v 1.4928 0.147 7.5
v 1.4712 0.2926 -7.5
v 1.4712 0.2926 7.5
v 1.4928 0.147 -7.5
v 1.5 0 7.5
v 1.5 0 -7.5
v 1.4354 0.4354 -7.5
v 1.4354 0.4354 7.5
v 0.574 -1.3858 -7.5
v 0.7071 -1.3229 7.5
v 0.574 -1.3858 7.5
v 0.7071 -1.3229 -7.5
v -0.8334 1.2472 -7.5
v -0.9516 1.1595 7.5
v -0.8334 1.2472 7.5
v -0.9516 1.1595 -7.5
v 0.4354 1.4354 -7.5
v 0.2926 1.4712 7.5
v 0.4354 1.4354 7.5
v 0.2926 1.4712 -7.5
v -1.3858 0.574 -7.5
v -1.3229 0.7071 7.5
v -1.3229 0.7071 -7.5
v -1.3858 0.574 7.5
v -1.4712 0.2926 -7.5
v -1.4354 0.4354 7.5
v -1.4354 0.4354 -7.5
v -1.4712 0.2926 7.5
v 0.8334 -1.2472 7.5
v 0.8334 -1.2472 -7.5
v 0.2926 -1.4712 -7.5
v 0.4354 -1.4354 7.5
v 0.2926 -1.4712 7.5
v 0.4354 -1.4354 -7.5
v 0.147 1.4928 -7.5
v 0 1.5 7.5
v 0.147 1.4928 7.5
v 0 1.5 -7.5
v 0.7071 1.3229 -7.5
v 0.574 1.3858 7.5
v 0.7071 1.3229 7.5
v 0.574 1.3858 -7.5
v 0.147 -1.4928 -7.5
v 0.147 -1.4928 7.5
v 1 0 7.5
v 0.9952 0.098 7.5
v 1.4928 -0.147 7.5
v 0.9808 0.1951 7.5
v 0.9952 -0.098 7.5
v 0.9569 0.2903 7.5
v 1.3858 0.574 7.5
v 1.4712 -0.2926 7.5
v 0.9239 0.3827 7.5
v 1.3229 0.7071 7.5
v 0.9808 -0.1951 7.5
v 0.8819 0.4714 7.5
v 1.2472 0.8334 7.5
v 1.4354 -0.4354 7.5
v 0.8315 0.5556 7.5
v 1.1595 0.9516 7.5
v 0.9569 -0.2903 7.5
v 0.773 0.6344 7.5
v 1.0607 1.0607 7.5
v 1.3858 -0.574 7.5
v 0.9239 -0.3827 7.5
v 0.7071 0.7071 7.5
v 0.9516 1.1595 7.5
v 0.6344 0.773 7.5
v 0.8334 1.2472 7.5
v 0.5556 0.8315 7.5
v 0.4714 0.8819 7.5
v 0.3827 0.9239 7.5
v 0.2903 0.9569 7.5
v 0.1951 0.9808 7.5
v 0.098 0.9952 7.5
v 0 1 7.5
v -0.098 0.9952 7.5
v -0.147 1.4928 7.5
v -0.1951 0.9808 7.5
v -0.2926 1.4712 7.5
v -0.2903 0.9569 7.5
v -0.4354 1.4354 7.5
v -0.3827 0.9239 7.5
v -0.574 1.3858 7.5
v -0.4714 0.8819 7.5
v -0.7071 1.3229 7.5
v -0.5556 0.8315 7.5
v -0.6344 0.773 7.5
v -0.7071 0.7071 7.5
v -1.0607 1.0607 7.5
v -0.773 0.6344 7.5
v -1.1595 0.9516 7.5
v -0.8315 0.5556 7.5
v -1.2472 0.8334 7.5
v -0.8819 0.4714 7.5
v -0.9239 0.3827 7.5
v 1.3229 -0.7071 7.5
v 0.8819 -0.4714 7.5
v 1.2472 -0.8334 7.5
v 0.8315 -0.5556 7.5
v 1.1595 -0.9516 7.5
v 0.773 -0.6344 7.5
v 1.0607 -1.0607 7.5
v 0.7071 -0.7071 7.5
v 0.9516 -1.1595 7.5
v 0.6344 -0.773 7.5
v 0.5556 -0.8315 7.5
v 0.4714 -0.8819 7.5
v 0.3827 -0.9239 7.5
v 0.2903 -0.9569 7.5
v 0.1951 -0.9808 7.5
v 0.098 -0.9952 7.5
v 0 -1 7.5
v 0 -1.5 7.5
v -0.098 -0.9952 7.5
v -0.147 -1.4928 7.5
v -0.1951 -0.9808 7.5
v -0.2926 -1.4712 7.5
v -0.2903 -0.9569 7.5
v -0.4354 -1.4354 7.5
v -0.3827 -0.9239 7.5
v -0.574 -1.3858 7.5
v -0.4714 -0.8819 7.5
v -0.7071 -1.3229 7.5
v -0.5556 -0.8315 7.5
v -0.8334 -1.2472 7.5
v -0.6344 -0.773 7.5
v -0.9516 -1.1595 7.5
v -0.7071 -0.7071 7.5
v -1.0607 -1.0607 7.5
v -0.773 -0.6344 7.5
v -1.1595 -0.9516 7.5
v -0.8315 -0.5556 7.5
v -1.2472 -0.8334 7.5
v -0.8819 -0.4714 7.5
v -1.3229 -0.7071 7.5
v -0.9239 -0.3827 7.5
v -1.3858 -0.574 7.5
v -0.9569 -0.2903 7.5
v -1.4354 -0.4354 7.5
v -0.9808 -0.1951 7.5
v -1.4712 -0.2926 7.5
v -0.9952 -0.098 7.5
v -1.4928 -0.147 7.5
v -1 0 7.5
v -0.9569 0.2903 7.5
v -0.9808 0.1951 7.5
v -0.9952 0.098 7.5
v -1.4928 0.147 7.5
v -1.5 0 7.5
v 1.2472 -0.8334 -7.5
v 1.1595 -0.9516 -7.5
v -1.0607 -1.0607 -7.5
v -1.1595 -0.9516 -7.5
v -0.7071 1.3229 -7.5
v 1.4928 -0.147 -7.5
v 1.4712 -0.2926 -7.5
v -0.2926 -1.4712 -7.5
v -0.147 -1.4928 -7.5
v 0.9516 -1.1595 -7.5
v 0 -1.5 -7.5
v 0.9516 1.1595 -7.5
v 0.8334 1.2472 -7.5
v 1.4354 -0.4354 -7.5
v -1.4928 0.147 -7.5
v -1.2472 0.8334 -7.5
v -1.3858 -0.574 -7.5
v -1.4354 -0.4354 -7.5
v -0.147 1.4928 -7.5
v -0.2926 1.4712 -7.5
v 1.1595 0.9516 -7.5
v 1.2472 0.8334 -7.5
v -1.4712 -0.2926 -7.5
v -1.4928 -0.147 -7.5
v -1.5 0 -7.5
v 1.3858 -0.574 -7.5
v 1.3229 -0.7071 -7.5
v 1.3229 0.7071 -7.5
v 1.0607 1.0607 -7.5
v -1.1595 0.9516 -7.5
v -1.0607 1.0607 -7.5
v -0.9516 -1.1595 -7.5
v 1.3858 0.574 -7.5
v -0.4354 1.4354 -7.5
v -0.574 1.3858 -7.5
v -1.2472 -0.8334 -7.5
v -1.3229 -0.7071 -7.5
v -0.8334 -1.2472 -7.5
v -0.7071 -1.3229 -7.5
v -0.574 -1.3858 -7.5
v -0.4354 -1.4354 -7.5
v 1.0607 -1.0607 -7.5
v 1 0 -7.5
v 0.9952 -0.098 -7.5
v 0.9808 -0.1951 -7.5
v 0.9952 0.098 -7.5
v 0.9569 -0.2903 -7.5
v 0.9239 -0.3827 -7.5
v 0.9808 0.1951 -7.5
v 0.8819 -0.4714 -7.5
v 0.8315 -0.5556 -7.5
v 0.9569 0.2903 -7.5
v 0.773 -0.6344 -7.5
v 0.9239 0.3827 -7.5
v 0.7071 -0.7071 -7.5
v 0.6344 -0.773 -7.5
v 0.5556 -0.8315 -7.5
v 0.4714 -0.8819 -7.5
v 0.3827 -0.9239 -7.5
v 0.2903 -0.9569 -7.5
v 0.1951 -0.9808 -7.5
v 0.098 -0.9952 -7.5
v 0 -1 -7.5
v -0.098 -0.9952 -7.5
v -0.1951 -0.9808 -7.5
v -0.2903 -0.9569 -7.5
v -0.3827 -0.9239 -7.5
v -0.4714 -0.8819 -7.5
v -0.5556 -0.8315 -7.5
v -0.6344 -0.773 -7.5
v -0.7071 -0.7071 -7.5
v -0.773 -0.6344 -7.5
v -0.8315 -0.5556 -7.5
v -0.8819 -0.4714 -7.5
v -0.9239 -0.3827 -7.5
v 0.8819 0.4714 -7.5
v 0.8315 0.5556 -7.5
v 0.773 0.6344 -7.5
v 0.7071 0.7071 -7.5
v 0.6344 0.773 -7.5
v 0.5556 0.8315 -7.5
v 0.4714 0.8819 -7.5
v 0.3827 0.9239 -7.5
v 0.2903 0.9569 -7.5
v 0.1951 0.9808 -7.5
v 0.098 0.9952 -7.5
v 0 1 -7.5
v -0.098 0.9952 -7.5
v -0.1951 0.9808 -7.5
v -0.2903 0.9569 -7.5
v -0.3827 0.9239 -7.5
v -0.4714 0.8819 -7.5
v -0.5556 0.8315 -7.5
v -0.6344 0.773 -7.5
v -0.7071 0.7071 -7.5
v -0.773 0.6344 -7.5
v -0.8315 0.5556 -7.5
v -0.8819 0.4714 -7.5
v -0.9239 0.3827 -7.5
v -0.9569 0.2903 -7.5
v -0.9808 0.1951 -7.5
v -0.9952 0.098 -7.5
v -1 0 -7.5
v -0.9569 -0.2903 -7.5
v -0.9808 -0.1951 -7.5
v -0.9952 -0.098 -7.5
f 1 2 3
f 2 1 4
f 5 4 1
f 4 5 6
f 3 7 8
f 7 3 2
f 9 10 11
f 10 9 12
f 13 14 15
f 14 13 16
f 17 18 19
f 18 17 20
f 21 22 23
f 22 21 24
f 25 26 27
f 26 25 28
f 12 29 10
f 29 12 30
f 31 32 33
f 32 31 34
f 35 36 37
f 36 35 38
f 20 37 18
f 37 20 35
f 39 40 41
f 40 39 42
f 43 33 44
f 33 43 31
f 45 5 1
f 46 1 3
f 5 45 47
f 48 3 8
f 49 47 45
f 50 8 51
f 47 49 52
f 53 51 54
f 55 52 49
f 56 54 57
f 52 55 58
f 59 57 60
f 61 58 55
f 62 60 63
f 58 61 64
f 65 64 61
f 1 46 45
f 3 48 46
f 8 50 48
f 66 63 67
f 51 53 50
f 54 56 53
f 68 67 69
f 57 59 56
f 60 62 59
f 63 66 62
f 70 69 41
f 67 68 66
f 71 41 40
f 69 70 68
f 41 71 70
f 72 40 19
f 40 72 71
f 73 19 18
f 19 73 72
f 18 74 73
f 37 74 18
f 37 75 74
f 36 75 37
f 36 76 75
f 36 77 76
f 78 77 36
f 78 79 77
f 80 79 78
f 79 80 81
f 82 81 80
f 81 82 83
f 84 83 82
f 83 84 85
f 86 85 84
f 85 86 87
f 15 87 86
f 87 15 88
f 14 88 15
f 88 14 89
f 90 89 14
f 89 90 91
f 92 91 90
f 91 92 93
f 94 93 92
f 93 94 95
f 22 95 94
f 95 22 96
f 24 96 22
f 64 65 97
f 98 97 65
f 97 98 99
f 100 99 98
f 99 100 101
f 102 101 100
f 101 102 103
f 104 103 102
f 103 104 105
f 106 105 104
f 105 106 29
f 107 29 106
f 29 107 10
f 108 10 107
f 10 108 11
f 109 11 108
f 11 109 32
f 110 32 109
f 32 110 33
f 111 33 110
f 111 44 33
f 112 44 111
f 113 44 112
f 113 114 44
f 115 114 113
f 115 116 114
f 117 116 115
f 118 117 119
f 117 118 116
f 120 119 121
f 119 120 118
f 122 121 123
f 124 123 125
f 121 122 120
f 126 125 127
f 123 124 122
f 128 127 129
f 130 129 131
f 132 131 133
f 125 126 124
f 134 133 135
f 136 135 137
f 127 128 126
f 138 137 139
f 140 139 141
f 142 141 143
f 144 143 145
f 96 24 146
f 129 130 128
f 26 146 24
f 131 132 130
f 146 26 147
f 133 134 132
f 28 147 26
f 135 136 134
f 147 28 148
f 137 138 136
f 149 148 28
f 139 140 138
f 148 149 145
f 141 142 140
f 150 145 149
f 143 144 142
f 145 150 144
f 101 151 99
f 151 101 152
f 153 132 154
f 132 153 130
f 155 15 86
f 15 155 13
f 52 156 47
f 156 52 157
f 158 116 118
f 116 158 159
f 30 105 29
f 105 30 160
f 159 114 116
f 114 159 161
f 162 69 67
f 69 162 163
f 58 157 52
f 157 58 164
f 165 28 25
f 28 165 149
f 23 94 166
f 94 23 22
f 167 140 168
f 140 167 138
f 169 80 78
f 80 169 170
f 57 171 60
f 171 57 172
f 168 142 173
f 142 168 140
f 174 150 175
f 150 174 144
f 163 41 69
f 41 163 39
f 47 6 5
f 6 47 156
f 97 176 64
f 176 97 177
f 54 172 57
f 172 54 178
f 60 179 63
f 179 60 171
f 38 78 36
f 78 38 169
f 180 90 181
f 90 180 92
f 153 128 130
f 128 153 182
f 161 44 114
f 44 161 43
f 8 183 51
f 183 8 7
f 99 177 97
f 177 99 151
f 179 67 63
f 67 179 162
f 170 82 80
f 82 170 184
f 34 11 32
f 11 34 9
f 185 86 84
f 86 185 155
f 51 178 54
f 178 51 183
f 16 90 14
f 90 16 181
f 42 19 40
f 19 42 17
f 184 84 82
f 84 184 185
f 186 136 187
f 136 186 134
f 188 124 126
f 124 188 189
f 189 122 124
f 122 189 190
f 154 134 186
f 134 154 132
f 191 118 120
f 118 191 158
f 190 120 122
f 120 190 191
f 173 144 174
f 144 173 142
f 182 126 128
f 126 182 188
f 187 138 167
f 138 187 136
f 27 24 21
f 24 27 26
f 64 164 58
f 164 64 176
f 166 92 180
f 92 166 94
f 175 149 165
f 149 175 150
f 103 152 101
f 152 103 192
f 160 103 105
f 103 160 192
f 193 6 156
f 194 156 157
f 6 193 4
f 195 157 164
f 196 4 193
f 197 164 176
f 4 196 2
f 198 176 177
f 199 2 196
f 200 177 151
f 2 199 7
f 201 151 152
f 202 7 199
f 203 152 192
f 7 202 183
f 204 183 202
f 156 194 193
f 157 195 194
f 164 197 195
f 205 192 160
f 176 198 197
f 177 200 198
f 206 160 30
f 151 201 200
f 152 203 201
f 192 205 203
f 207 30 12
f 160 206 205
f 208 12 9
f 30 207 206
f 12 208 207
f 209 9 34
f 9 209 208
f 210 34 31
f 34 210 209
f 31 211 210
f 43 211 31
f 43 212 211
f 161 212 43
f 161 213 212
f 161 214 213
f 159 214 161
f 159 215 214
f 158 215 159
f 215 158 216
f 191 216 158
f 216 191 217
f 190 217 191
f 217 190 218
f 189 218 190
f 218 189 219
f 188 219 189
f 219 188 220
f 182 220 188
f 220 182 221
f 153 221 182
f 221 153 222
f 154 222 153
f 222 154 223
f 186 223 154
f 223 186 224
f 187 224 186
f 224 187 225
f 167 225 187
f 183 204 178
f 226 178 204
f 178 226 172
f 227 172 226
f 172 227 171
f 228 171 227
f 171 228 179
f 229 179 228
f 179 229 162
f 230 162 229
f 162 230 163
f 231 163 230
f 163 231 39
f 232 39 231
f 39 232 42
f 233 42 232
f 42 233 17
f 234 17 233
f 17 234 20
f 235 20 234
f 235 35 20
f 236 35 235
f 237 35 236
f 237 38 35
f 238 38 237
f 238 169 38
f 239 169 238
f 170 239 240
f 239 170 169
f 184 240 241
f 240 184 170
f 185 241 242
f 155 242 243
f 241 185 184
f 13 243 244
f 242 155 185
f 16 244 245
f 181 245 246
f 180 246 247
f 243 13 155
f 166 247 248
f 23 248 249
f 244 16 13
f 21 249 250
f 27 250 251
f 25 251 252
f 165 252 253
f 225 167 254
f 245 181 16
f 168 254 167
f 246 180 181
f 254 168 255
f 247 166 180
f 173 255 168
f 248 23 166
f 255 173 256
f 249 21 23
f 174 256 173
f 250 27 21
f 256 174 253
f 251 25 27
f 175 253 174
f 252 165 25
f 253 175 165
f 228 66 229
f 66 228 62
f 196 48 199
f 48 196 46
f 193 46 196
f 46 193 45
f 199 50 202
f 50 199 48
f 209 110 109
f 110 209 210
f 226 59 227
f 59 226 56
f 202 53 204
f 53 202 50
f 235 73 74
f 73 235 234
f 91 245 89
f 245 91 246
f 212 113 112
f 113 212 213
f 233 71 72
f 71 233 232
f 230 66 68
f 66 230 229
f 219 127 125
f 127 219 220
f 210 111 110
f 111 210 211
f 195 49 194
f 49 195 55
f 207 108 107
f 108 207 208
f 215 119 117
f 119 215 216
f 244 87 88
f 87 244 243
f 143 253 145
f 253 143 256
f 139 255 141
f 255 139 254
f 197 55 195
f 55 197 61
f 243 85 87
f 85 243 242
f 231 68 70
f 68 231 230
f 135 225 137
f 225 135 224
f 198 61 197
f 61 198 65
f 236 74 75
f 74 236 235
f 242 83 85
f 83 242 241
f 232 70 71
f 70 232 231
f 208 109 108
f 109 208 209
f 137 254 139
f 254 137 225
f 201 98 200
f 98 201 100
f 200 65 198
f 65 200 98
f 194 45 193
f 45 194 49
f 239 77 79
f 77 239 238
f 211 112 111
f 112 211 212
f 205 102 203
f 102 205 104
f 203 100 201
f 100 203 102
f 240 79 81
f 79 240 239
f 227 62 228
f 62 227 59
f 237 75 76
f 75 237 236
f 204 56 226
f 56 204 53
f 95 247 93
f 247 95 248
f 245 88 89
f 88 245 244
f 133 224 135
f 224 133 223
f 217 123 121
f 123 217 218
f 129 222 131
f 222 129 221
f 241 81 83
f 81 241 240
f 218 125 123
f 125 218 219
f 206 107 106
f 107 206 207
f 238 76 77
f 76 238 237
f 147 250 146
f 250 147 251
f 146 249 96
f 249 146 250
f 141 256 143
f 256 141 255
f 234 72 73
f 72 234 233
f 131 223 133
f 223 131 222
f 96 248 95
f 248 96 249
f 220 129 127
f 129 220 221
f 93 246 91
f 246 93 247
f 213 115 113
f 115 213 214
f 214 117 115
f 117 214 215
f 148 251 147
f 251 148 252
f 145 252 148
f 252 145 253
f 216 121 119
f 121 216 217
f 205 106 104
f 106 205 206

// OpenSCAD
// Parameters
length = 15; //[7.5:30:0.5]
forced_id = 0; //[0:10:0.1]
default_id = 2; //[1:4:0.1]
default_od = 3; //[1.5:6:0.1]
center = 1; //[0:1:1]
eps = 0.8; //[0.5:2:0.1]

// Tubing - complete geometry
module tubing() {
  color([0.85, 0.85, 0.8]) { // Off-white for PTFE
    difference() {
      // Outer tubing body
      translate([0, 0, ((center > 0) ? 0 : (length / 2))])
        cylinder(h=length, r=((default_od + ((forced_id > 0) ? forced_id : default_id) - default_id) / 2), center=true, $fn=64);
      
      // Inner hollow bore
      translate([0, 0, ((center > 0) ? 0 : (length / 2))])
        cylinder(h=length + 2 * eps, r=(((forced_id > 0) ? forced_id : default_id) / 2), center=true, $fn=64);
    }
  }
}

// Assembly
module assembly() {
  tubing();
}

assembly();
